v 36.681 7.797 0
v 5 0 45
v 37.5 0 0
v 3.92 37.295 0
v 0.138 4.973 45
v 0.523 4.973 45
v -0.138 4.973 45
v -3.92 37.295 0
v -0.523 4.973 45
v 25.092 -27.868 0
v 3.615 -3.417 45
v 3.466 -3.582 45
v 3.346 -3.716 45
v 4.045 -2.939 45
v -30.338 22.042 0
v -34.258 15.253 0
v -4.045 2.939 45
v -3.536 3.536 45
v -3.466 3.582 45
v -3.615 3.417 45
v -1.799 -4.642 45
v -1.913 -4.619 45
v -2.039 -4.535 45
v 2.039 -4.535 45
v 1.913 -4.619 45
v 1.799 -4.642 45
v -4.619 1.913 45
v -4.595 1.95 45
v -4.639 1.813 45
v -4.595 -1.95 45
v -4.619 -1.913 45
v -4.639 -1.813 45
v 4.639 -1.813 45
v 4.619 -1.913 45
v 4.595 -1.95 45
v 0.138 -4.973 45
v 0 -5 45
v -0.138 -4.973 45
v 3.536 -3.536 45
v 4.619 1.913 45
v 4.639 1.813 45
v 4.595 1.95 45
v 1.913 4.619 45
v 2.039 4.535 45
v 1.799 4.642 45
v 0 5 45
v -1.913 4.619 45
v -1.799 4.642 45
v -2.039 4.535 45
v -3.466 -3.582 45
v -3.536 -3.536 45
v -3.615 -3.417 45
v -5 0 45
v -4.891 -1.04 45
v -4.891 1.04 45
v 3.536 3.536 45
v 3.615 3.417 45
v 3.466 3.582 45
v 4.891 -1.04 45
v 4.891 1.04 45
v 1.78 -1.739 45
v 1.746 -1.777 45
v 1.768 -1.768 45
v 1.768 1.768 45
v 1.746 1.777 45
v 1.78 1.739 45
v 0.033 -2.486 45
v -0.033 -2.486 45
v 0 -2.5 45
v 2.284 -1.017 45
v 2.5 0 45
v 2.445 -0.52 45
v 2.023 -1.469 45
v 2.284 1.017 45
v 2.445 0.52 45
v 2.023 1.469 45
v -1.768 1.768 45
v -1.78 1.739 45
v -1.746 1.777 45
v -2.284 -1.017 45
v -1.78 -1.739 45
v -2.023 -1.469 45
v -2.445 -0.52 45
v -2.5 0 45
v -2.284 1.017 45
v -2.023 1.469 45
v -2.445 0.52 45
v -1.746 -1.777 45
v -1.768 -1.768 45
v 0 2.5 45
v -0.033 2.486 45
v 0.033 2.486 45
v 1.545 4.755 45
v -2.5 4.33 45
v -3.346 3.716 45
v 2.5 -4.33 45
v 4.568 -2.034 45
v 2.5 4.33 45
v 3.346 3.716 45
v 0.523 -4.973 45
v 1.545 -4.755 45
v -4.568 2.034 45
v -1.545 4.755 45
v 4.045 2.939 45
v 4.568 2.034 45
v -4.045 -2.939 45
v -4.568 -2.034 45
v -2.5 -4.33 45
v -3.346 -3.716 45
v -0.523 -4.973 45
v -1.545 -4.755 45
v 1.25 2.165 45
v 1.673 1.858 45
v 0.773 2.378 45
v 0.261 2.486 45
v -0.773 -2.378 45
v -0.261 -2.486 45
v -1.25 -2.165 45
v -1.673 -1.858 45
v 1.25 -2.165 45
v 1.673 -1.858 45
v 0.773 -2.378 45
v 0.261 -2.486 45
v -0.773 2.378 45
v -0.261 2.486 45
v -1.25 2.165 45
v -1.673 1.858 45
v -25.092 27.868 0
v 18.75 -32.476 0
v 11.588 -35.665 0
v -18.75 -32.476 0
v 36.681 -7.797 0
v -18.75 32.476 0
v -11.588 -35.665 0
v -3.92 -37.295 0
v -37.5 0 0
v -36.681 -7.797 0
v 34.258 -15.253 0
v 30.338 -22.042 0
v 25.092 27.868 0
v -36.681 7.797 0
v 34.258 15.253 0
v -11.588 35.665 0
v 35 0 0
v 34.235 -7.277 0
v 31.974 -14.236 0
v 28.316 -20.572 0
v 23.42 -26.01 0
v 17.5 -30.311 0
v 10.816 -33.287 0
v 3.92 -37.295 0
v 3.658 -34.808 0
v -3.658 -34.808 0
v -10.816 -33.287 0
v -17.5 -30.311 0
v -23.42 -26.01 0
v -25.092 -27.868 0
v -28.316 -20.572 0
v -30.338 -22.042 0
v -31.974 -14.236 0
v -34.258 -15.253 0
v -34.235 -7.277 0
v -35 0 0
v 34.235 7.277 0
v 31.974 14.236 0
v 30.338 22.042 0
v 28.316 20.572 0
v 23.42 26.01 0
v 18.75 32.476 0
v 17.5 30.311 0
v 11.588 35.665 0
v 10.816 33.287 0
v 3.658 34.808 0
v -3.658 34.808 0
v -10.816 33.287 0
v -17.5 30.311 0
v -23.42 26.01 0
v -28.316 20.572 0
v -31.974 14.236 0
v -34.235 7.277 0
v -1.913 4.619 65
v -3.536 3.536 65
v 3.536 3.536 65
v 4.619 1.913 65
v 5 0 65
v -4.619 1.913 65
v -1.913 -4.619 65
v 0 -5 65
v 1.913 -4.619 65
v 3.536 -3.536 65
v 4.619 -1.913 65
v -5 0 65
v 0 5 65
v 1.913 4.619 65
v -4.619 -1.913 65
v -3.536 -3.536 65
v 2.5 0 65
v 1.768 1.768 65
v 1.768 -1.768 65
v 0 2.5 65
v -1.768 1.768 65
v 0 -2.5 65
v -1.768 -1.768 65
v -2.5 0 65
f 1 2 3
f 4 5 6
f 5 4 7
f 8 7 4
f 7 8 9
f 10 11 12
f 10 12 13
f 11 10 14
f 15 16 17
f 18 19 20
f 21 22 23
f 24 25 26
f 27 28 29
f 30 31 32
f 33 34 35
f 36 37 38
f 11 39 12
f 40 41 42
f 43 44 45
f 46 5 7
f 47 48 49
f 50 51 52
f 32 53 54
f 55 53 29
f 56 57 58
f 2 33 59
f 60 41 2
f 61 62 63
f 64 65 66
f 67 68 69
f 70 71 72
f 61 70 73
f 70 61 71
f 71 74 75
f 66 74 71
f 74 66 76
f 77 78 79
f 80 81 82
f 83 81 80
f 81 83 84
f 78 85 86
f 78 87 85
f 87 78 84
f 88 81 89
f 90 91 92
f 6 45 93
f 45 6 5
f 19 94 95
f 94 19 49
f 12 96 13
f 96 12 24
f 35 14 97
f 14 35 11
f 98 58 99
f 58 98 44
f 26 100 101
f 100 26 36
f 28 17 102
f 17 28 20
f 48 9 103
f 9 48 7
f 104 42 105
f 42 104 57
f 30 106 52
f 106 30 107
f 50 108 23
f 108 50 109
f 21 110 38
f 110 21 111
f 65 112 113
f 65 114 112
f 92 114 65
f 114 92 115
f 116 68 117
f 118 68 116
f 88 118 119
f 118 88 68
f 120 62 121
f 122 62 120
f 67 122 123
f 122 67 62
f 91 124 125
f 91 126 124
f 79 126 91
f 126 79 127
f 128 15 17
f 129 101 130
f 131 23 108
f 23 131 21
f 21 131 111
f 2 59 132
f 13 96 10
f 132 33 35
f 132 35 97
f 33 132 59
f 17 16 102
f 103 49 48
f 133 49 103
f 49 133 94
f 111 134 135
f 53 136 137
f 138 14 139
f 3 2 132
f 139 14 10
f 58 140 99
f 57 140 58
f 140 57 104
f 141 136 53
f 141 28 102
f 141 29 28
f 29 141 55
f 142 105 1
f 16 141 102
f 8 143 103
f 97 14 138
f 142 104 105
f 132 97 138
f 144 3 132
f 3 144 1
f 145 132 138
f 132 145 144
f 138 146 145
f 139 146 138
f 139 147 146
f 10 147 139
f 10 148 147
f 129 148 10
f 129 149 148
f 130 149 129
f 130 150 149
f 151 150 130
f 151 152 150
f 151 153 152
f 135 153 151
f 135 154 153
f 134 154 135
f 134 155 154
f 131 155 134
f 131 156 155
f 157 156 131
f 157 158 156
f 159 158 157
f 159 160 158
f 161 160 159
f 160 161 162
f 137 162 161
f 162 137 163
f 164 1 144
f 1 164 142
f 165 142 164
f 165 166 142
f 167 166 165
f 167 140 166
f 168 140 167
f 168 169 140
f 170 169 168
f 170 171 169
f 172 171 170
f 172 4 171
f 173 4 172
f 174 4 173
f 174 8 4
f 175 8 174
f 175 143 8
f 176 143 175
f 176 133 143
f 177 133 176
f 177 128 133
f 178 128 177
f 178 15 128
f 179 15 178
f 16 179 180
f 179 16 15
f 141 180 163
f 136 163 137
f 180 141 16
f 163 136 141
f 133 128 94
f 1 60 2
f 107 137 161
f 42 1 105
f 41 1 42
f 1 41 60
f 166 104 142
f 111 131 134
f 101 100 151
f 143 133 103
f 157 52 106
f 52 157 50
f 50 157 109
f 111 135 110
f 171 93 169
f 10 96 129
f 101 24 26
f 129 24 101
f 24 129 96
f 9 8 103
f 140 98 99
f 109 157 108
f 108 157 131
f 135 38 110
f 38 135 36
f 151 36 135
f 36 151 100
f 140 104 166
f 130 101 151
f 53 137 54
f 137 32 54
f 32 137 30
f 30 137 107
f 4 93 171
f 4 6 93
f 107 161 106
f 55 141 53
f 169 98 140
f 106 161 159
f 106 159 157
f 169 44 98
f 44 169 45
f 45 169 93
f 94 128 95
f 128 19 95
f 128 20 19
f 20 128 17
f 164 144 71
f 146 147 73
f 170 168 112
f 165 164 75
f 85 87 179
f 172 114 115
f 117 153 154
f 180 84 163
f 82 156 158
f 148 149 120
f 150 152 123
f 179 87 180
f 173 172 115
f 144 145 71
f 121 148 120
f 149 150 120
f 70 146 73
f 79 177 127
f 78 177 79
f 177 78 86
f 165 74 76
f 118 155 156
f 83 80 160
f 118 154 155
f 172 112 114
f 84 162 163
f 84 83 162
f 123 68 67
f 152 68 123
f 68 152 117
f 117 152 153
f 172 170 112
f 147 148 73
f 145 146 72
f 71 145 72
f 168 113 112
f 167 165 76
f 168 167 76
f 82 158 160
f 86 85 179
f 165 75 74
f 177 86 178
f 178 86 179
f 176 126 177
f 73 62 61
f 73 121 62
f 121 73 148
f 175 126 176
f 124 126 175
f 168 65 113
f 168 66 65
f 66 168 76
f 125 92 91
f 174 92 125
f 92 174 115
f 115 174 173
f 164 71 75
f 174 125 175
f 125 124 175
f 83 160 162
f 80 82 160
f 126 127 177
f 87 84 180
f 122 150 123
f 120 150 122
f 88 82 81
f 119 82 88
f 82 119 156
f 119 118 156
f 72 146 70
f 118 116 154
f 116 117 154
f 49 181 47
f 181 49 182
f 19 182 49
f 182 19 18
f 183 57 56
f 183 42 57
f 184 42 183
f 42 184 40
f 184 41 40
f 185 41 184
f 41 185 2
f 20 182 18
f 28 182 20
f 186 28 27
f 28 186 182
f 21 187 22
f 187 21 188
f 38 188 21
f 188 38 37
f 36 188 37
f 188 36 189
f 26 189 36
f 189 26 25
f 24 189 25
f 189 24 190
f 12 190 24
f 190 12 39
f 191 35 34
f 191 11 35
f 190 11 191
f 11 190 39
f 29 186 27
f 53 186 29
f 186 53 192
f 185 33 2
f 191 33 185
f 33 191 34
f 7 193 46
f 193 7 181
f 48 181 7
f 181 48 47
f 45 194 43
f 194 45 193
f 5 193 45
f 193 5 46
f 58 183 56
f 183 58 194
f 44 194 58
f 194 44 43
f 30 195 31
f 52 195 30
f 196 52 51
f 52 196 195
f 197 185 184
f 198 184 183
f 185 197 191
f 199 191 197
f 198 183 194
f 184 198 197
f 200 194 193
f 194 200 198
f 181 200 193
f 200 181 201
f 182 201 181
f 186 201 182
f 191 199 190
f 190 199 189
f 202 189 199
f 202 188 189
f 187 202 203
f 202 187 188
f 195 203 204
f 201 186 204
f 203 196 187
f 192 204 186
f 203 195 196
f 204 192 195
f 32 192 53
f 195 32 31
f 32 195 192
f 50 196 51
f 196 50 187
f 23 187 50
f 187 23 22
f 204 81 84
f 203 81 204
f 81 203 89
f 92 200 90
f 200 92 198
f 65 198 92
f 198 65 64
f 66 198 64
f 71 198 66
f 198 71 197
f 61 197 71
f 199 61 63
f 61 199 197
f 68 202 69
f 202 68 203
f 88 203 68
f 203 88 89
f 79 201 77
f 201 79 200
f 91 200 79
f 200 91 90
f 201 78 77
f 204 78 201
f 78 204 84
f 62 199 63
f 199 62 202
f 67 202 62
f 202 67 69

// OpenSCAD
// [FL_INDEX: keywords="openscad, 3d_parametric, Day_9__Funnel__Parametric, csg_solid" | COT="Parametric OpenSCAD design from 3DCodeverse"]
// Title: Day 9: Funnel, Parametric

// Parametric Funnel by Coasterman

// VARIABLES
bottom_diameter = 70;
cone_height = 45;
top_diameter = 5;
top_height = 20;
width = 2.5;

// CODE
union()
{
difference()
{
cylinder(h=cone_height, r1=bottom_diameter/2 + width, r2 = top_diameter/2 + width);
cylinder(h=cone_height, r1=bottom_diameter/2, r2 = top_diameter/2);
}
translate([0, 0, cone_height])
{
difference()
{
cylinder(h=top_height, r=top_diameter/2 + width);
cylinder(h=top_height, r=top_diameter/2);
}
}
}
